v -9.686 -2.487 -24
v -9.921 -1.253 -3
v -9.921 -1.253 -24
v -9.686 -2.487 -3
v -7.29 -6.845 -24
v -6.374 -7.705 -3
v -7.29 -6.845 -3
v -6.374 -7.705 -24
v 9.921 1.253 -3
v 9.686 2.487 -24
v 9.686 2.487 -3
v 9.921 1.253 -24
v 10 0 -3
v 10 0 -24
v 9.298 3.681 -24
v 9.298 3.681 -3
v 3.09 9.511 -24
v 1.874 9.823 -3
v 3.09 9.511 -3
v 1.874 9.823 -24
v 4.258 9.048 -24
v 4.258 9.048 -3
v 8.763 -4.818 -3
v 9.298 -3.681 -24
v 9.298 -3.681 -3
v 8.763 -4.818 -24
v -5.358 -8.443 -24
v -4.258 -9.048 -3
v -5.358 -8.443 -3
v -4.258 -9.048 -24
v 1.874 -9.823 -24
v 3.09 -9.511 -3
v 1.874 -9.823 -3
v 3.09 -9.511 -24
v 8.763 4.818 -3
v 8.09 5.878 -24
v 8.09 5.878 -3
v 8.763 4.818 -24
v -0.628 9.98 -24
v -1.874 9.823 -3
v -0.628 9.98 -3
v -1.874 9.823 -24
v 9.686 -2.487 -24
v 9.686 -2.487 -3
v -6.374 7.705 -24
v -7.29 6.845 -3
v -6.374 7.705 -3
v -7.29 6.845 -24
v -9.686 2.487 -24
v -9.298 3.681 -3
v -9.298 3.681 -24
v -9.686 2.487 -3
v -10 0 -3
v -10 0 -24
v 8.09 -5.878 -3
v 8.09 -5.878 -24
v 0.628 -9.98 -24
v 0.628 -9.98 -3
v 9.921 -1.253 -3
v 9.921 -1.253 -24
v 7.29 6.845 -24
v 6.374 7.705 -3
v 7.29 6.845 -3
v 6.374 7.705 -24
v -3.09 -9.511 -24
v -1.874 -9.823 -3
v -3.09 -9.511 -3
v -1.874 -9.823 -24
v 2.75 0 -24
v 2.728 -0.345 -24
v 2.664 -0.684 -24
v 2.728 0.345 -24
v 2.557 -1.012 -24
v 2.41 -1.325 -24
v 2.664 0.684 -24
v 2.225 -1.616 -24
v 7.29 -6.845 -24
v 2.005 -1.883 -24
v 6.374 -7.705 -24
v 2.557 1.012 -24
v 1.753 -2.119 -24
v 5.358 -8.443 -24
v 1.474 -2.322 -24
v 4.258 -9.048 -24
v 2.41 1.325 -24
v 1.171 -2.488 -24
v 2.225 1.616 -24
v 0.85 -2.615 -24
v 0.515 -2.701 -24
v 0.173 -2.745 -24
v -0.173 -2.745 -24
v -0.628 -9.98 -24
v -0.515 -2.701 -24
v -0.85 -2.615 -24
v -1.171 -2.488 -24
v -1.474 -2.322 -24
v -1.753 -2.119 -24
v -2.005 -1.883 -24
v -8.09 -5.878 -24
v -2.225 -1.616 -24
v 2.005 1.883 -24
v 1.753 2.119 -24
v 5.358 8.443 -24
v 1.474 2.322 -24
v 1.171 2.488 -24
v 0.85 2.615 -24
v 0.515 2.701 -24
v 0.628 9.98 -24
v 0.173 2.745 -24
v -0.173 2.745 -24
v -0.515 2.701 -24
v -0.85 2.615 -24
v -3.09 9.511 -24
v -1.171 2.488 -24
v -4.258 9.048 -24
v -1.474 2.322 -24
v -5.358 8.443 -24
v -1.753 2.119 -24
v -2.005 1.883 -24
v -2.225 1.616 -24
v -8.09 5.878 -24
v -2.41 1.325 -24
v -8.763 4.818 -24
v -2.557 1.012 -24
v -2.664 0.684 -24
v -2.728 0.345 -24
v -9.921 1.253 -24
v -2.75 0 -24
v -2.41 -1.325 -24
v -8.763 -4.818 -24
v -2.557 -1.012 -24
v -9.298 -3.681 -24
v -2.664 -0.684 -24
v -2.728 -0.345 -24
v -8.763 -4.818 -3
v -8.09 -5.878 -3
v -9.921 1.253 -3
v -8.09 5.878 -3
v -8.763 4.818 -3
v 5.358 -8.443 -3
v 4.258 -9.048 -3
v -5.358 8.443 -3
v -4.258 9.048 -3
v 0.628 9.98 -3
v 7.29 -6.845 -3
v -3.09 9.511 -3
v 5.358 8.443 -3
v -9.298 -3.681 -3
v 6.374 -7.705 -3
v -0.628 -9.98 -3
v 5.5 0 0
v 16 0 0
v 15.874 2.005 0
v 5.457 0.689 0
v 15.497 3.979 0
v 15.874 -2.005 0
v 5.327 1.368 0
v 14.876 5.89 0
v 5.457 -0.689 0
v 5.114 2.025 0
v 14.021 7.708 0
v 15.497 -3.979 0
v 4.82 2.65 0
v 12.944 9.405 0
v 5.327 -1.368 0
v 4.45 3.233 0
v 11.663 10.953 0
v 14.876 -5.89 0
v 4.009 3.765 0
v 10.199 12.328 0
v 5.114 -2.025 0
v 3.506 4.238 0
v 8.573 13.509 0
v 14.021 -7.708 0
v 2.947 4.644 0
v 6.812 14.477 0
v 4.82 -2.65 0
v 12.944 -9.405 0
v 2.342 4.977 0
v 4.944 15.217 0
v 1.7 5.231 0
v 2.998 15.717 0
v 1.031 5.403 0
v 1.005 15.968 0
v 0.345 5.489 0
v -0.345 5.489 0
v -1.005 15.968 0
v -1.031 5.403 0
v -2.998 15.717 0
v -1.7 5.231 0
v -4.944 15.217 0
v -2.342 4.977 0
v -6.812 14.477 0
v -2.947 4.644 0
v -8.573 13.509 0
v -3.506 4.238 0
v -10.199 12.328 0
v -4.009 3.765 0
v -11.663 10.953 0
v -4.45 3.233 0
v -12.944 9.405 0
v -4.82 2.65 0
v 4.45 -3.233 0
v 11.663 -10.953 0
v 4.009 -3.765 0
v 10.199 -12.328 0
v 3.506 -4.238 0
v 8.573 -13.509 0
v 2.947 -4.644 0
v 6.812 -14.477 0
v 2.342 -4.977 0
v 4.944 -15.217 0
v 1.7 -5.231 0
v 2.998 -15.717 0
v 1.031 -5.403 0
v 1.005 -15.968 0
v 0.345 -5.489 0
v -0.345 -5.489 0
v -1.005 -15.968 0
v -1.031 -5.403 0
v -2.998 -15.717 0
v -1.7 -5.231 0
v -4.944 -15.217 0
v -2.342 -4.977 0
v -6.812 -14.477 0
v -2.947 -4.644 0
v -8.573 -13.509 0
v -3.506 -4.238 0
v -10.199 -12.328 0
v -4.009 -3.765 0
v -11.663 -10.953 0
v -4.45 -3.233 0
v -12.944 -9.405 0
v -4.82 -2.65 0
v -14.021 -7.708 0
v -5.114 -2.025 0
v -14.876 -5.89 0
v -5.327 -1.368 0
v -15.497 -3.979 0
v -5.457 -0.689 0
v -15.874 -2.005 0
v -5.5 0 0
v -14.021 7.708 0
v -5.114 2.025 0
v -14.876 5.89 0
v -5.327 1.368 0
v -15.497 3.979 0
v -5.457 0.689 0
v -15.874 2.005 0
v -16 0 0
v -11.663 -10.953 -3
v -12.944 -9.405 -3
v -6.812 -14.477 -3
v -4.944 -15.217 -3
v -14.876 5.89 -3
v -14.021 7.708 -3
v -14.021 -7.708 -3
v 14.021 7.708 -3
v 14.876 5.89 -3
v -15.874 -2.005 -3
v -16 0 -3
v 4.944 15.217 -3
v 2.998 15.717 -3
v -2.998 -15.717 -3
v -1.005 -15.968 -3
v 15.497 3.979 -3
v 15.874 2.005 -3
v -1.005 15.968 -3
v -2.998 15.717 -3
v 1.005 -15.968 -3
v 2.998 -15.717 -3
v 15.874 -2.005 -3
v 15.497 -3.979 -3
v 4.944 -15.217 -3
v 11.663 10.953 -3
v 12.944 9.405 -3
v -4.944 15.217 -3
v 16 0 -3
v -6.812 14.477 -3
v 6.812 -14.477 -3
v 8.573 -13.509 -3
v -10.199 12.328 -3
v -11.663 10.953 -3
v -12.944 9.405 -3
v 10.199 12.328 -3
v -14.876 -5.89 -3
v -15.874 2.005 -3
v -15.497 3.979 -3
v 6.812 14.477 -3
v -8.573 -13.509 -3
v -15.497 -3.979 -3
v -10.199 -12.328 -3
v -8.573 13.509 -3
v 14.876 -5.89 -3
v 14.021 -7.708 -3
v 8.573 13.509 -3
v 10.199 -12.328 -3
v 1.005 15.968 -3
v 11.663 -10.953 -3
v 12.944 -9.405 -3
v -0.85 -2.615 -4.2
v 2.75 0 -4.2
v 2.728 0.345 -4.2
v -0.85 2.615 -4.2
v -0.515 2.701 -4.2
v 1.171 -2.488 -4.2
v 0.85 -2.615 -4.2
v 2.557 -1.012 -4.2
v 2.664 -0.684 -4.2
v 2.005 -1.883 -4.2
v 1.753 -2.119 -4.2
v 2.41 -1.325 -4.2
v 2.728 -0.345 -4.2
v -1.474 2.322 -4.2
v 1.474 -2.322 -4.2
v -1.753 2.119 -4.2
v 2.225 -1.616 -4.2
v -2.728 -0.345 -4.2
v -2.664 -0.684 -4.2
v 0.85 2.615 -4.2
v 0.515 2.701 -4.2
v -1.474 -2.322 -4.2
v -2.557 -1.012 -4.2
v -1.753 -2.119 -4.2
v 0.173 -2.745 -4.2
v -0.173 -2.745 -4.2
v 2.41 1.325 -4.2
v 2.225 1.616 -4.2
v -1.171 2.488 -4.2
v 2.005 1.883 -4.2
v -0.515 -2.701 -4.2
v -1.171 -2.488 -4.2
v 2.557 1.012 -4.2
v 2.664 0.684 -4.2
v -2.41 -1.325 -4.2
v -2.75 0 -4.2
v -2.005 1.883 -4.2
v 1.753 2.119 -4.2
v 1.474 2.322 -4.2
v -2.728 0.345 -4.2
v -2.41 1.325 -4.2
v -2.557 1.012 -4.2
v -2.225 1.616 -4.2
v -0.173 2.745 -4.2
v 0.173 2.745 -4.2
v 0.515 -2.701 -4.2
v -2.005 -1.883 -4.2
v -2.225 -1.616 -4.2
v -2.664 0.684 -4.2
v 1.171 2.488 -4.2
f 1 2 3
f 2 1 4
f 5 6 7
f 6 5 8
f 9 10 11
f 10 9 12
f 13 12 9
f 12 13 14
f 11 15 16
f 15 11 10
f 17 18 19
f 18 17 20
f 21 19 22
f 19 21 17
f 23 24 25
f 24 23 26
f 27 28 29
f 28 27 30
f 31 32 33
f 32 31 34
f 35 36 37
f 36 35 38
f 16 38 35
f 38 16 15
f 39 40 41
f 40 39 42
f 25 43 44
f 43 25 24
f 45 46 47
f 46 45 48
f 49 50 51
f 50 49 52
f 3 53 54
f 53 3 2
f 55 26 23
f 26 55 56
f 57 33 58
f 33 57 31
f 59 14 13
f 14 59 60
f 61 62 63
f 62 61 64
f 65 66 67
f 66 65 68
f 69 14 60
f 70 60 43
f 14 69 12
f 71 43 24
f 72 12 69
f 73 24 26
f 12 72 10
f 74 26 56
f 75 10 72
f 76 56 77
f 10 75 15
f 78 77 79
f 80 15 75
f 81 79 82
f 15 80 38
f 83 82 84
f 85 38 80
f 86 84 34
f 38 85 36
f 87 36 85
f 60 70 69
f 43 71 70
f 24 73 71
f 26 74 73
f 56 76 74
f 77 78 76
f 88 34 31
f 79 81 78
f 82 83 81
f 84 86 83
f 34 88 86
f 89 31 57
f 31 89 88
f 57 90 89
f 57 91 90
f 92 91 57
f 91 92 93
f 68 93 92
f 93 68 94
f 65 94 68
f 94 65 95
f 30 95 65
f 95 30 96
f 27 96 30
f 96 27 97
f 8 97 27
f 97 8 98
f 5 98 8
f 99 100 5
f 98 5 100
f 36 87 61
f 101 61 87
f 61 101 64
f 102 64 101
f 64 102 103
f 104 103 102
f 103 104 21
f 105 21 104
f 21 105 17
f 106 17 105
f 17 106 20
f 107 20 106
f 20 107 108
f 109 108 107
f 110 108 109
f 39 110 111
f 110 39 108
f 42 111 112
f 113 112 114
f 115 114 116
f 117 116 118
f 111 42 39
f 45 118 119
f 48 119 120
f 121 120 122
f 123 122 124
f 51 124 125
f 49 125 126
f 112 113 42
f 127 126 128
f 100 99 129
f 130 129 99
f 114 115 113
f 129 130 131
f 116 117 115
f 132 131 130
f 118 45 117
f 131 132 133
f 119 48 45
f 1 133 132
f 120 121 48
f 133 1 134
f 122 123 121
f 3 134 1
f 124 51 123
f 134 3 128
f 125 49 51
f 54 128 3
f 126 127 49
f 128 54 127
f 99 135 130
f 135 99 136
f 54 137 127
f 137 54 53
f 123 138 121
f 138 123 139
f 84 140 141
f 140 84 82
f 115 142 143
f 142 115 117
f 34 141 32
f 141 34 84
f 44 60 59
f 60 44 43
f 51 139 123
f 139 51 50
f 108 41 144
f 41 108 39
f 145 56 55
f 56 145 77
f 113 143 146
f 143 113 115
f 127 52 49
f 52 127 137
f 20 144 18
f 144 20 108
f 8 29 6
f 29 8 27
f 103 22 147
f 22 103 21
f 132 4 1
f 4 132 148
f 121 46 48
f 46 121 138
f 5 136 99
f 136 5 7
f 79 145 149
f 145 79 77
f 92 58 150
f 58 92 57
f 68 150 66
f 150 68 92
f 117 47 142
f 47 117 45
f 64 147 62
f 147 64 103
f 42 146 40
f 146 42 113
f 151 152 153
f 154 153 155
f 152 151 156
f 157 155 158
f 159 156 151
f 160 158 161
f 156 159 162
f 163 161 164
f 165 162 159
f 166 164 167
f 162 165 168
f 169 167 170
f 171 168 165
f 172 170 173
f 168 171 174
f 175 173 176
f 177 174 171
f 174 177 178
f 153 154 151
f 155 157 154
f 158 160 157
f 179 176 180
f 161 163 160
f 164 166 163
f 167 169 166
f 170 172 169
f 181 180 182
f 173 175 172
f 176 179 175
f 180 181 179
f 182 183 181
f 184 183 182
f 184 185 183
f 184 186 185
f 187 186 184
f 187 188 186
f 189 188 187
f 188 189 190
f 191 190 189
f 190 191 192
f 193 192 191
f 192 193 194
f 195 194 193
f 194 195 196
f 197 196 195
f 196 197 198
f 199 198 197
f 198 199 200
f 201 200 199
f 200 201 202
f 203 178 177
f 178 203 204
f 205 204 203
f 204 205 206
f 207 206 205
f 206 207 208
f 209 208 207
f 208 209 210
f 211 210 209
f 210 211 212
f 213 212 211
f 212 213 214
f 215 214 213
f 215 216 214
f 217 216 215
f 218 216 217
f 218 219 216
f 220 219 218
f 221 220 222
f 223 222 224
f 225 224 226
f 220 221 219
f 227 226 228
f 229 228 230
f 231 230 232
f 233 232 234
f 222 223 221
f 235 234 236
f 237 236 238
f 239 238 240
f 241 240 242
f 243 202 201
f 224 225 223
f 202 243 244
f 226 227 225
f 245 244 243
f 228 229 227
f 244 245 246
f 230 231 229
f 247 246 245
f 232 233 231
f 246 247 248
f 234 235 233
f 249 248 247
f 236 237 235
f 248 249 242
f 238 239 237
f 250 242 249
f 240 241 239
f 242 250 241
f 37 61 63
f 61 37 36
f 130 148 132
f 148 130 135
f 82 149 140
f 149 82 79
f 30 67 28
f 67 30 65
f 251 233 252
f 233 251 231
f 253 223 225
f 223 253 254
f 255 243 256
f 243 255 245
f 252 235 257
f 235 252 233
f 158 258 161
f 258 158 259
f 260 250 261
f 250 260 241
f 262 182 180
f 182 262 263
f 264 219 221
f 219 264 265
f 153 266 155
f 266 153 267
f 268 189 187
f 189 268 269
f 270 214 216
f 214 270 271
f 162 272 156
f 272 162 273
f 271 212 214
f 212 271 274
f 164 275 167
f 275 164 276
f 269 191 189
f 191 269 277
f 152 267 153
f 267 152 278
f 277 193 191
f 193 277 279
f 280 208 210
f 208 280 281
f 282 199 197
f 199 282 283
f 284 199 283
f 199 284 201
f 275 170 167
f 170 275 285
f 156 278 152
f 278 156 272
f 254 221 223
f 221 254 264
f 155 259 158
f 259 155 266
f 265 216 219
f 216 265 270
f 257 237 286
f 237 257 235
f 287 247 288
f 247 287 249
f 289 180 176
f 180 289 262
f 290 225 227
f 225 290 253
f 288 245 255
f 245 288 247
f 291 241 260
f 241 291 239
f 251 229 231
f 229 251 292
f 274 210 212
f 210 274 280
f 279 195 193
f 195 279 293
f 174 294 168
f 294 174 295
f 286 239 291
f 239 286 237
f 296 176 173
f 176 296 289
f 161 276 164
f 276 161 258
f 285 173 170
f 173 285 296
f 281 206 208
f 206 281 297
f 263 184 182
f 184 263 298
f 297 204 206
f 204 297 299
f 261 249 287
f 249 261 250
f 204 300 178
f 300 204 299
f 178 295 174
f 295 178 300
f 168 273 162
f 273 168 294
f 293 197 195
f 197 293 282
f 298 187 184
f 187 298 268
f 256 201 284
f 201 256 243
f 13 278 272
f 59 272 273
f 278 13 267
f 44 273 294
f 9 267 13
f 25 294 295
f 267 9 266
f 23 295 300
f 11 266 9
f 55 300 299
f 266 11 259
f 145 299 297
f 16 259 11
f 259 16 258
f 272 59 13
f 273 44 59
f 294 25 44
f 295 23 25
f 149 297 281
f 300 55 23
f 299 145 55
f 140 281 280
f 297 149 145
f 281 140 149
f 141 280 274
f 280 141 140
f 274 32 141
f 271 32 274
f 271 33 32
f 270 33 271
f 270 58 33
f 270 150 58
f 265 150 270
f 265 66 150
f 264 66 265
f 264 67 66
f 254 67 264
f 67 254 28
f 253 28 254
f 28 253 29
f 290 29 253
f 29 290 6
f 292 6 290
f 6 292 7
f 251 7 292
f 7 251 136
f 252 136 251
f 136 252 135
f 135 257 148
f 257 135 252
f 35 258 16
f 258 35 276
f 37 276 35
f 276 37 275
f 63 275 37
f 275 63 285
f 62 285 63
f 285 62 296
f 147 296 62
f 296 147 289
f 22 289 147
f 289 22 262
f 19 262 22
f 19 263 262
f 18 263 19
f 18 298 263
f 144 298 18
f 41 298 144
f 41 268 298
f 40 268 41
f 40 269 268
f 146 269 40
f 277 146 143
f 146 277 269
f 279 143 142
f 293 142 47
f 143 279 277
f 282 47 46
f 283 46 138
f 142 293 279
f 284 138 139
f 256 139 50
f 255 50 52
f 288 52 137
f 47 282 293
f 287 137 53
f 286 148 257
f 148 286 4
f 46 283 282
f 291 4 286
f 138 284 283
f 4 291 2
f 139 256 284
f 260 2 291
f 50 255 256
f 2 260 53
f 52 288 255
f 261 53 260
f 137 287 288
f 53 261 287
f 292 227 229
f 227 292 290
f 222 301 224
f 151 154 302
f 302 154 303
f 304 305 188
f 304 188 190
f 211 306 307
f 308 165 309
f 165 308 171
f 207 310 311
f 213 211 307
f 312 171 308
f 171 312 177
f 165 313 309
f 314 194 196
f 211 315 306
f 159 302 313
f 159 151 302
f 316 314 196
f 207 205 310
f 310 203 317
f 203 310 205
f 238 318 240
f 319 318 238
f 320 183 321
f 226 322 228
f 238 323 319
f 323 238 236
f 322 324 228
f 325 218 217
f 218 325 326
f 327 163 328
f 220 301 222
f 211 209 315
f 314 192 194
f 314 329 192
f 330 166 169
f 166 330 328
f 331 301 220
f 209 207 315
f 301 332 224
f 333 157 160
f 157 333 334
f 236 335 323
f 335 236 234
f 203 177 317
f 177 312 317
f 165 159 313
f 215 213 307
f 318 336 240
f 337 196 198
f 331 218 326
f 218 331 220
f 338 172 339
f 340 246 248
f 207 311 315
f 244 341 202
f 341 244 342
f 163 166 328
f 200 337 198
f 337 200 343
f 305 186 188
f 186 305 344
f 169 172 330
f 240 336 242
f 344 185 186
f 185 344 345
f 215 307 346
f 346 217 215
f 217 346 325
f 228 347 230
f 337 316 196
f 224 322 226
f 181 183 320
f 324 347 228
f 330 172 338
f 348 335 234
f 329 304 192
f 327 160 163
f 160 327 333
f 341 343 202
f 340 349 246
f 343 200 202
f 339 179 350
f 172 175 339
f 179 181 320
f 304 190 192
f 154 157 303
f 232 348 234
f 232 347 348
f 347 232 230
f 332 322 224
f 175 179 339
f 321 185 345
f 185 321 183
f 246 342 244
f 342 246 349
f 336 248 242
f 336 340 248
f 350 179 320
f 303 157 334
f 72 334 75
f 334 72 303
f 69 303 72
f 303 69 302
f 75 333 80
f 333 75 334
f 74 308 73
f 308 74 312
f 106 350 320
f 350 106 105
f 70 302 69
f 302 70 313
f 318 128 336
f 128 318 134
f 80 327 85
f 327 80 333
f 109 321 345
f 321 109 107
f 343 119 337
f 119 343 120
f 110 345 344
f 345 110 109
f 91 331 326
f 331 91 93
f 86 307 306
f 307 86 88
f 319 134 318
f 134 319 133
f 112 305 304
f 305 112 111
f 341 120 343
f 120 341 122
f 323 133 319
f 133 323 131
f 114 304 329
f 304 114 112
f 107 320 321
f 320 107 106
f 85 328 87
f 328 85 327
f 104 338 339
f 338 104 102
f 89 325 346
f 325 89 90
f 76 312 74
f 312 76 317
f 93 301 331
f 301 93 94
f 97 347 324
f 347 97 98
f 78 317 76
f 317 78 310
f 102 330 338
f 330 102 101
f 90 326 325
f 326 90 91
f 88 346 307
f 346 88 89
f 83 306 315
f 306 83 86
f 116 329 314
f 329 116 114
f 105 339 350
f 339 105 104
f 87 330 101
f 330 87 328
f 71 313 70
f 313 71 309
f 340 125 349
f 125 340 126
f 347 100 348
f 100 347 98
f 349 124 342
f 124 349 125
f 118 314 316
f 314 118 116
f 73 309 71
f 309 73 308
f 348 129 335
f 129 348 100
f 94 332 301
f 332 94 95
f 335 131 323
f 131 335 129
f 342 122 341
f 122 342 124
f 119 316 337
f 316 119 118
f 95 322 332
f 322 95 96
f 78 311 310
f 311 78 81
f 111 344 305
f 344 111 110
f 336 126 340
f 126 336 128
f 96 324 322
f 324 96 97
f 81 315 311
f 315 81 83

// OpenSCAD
$fn = 50;


difference() {
	union() {
		translate(v = [0, 0, -24.0000000000]) {
			cylinder(h = 24, r = 10.0000000000);
		}
		translate(v = [0, 0, -3.0000000000]) {
			cylinder(h = 3, r = 16.0000000000);
		}
	}
	union() {
		translate(v = [0, 0, 0]) {
			rotate(a = [0, 0, 0]) {
				difference() {
					union() {
						#translate(v = [0, 0, -24.0000000000]) {
							cylinder(h = 24, r = 2.2500000000);
						}
						#translate(v = [0, 0, -4.2000000000]) {
							cylinder(h = 4.2000000000, r = 10.0000000000, r1 = 2.7500000000, r2 = 5.5000000000);
						}
						#translate(v = [0, 0, -24.0000000000]) {
							cylinder(h = 24, r = 2.7500000000);
						}
						#translate(v = [0, 0, -24.0000000000]) {
							cylinder(h = 24, r = 2.2500000000);
						}
					}
					union();
				}
			}
		}
	}
}
